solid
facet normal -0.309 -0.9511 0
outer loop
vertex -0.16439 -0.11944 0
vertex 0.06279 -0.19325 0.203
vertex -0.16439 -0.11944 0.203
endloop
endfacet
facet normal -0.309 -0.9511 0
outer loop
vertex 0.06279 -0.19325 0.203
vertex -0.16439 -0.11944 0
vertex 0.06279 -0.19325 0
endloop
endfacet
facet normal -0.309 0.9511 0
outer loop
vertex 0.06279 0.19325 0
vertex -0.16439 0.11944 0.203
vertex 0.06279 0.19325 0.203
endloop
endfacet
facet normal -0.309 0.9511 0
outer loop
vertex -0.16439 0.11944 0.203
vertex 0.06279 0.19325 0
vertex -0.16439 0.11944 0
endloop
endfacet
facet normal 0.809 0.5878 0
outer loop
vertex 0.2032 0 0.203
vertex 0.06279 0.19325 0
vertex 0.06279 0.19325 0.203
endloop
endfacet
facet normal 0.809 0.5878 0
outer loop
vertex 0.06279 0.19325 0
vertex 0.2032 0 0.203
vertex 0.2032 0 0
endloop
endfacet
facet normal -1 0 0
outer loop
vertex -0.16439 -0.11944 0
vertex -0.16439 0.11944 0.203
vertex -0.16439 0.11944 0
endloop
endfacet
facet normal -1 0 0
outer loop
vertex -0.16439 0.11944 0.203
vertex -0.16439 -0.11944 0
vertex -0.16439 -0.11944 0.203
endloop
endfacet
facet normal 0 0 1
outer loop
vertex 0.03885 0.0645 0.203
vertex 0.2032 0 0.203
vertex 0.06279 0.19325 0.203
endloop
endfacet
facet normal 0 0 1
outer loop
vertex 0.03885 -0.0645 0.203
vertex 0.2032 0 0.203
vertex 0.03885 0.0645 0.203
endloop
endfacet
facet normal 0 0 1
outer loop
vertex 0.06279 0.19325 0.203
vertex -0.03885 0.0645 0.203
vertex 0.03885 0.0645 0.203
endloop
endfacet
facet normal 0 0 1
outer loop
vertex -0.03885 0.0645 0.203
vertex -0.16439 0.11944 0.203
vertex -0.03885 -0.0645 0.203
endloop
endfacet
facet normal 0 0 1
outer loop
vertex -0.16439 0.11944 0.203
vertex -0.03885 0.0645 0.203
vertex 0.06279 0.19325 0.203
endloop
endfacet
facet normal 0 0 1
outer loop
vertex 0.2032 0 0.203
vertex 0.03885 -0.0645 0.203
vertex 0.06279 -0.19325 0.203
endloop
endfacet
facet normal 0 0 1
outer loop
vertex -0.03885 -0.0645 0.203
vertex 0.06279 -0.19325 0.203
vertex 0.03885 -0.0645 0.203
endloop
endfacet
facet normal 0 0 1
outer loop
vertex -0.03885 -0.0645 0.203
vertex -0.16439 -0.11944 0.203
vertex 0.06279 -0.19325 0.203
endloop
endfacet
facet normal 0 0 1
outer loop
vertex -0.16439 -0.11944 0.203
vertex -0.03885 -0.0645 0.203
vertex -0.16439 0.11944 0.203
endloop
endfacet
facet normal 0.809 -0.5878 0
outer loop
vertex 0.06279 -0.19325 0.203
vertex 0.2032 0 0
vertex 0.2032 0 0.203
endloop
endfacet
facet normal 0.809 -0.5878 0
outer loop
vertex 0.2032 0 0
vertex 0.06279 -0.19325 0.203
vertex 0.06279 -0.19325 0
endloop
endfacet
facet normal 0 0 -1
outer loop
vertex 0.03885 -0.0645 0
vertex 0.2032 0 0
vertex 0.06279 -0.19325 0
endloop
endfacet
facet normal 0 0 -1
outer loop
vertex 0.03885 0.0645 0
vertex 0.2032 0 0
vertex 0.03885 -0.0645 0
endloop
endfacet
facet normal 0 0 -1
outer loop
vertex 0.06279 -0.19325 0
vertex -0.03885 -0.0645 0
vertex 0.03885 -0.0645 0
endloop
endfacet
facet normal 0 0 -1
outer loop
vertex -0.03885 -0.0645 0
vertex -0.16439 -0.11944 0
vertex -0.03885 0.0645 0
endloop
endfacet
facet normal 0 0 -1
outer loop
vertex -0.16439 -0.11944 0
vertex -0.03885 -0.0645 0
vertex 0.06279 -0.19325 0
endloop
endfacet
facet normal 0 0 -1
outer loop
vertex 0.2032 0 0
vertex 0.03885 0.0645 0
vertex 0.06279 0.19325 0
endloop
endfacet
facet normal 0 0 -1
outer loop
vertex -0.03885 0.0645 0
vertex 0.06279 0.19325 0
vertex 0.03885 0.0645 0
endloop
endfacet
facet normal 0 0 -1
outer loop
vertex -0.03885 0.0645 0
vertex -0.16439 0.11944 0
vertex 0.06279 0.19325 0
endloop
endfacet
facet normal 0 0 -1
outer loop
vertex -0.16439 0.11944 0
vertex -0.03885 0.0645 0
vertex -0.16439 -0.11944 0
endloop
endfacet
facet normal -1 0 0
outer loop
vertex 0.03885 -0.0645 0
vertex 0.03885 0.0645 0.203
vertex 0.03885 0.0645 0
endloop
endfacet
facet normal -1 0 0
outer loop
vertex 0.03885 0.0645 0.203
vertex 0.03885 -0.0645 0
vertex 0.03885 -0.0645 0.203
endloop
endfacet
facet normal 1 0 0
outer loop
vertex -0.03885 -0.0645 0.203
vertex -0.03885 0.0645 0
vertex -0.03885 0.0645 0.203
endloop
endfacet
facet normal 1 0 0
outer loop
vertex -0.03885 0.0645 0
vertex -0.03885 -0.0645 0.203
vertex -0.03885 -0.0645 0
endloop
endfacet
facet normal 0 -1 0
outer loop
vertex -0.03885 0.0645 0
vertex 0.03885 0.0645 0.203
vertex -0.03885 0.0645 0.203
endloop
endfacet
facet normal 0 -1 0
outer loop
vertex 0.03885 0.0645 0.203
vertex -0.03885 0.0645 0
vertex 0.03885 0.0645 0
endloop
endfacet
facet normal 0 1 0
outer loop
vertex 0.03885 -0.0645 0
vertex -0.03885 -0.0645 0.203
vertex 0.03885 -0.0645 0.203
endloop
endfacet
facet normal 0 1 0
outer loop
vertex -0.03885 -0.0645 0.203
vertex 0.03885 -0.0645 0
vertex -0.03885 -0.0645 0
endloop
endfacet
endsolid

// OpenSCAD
hub_z = .0254;
hub_r = .2032;
hub_a = .0777;
hub_b = .129;

wheel_z = .203;
wheel_r = .254;

v_depth = 5;

module body() {
 total_z =  wheel_z;
 difference() {
   cylinder(h=total_z,r=hub_r);
   translate([-hub_a/2,-hub_b/2,0]) {
     cube([hub_a,hub_b,total_z], 1);
   }
 }
}

module groove() {
 rotate_extrude(convexity = 100) 
   translate([10-3, 1.5, 0])
     rotate(0)
       square([v_depth,v_depth],0); 
}

module no_screws() {
  difference() {
    body();
    groove();
  }
}

no_screws ();
